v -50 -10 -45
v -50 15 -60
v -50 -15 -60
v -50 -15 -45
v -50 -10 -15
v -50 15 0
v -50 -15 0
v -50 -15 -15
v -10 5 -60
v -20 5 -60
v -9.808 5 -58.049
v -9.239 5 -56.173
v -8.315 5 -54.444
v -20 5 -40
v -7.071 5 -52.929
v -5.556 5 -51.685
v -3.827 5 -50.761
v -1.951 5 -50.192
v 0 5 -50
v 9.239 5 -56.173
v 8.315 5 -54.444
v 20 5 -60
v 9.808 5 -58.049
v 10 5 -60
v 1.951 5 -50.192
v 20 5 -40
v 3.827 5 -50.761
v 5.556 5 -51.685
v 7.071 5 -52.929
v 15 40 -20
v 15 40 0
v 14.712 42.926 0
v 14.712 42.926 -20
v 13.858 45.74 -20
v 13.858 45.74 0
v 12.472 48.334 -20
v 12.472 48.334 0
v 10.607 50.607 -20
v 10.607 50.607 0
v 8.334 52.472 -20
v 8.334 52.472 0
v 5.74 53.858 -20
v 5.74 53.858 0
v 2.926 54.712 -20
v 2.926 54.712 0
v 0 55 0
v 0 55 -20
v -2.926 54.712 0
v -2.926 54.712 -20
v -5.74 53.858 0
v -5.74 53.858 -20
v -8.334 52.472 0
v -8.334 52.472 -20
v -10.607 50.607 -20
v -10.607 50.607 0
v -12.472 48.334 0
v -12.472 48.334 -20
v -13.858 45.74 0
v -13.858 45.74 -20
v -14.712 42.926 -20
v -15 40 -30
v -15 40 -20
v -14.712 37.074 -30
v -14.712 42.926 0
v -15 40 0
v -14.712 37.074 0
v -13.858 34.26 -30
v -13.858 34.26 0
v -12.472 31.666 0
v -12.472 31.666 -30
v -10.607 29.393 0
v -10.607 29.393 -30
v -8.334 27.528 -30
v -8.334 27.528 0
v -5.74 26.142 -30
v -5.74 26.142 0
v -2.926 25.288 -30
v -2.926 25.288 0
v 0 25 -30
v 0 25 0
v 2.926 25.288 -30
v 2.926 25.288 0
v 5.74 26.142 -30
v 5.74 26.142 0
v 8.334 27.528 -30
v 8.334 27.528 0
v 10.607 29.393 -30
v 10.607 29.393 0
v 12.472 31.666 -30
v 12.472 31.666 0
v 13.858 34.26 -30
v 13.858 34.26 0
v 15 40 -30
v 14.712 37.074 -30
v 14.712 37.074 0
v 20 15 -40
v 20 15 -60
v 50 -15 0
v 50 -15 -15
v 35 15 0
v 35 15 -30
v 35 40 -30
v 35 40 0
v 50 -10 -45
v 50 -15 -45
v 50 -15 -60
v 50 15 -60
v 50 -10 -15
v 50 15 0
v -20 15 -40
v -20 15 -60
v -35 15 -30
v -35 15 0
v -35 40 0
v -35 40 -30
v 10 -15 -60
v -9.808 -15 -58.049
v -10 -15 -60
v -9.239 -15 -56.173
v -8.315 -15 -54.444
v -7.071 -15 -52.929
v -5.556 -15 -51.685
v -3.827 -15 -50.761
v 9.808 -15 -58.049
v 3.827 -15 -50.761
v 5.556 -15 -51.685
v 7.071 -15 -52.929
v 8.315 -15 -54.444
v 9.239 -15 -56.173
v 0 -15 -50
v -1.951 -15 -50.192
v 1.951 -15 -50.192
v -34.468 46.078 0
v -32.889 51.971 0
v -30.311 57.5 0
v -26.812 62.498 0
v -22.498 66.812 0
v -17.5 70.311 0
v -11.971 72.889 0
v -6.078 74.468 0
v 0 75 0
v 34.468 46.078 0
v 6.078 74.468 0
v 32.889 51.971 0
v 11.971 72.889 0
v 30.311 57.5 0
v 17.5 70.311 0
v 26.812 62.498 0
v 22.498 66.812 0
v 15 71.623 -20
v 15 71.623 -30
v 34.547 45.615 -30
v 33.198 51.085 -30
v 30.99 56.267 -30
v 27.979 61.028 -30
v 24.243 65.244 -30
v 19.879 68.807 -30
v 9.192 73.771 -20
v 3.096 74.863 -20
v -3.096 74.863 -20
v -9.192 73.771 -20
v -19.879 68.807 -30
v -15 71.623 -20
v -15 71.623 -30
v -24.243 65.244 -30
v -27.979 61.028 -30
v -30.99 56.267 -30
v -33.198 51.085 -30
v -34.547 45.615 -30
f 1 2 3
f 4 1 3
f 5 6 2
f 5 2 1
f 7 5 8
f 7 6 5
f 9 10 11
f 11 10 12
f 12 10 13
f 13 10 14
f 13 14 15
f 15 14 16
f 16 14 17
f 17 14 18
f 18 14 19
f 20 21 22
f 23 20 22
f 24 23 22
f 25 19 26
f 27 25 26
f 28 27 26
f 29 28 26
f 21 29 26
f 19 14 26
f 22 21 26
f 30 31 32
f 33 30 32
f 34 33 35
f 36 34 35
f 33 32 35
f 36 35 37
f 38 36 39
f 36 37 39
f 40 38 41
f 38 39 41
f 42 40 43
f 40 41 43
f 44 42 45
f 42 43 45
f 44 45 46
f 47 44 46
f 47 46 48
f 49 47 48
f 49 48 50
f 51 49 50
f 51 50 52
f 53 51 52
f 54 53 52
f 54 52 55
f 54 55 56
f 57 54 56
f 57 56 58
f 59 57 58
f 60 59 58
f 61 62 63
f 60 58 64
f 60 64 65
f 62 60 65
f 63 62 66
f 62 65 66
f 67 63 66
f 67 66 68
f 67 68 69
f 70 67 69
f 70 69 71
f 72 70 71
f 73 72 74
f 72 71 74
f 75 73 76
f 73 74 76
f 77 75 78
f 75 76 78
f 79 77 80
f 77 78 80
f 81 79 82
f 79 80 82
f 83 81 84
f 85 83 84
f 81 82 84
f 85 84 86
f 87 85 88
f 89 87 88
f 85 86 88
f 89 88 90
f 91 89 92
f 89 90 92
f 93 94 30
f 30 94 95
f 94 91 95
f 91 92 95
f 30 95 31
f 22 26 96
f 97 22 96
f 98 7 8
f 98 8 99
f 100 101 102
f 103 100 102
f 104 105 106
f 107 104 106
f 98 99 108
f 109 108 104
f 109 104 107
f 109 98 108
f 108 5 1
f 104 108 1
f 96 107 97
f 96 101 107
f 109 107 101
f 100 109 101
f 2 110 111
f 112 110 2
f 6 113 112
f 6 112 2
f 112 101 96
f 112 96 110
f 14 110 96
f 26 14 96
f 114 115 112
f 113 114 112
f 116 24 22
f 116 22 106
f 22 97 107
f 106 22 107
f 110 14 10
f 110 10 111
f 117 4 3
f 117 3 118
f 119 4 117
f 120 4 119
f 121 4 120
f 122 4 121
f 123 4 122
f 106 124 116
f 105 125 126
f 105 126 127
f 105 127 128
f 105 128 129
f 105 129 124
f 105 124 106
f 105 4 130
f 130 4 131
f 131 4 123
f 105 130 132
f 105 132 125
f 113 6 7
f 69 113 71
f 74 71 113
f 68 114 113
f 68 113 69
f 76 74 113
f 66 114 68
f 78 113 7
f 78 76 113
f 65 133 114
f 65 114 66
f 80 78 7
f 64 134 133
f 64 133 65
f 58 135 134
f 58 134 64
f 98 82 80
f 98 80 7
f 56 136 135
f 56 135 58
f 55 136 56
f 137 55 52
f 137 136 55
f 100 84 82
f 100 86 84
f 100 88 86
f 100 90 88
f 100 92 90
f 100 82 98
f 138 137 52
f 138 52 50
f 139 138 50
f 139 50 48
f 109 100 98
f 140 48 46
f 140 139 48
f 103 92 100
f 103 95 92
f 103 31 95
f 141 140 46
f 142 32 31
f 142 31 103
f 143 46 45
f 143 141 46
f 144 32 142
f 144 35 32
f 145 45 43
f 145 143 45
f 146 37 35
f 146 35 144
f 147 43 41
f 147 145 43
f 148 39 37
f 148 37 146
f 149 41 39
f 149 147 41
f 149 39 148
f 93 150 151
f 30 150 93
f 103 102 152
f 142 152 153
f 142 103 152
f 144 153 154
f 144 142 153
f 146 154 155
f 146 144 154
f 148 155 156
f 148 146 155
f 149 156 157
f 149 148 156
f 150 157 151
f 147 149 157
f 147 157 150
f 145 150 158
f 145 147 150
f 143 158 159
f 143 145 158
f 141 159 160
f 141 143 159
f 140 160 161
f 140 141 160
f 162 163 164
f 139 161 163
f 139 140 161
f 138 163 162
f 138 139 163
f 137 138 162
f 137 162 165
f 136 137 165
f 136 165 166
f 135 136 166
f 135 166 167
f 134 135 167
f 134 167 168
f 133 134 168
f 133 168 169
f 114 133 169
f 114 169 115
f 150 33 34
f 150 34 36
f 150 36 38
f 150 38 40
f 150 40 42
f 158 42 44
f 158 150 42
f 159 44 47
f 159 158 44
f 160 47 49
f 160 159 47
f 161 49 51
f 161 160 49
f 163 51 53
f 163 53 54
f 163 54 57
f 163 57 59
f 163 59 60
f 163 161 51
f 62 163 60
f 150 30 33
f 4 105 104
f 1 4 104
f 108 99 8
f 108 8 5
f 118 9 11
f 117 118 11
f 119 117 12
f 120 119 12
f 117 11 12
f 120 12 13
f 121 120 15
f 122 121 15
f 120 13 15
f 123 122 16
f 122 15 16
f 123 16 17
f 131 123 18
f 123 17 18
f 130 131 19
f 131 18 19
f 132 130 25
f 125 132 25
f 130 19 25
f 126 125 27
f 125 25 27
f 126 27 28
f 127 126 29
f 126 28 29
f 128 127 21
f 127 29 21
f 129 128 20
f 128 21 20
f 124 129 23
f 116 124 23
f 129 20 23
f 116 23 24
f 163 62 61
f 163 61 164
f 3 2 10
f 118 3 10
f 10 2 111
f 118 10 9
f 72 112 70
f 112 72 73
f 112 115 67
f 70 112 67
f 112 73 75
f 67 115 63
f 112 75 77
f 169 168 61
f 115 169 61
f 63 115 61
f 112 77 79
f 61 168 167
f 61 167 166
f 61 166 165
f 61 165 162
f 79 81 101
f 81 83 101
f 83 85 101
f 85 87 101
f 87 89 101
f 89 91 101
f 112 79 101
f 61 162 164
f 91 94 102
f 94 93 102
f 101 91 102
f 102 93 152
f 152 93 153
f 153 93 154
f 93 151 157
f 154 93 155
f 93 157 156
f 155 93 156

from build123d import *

# Parameters (mm, degrees)
SKETCH1_W           = 100
SKETCH1_H           = 30
BOSS_EXTRUDE1_DEPTH = 60
SKETCH1_3_R         = 15
BOSS_EXTRUDE2_DEPTH = 30
CUT_EXTRUDE1_START  = -40
SKETCH1_4_W         = 40
SKETCH1_4_H         = 10
CUT_EXTRUDE1_DEPTH  = 69.282039139
SKETCH2_W           = 30
SKETCH2_H           = 10
CUT_EXTRUDE2_DEPTH  = 139.654246239
CUT_EXTRUDE3_START  = -10
CUT_EXTRUDE3_DEPTH  = 10
SKETCH4_R           = 10
CUT_EXTRUDE4_DEPTH  = 105.880884817


with BuildPart() as part:
    # Sketch1 → Boss-Extrude1 (new body)
    with BuildSketch(Plane.XY):
        Rectangle(SKETCH1_W, SKETCH1_H)
    extrude(amount=-BOSS_EXTRUDE1_DEPTH)

    # Sketch1<3> → Boss-Extrude2 (add)
    with BuildSketch(Plane.XY):
        with BuildLine():
            Line((-35, 40), (-35, 15))
            Line((-35, 15), (-20, 15))
            Line((-20, 15), (20, 15))
            Line((20, 15), (35, 15))
            Line((35, 15), (35, 40))
            ThreePointArc((35, 40), (0, 75), (-35, 40))
        make_face()
        with Locations((0, 40)):
            Circle(SKETCH1_3_R, mode=Mode.SUBTRACT)
    extrude(amount=-BOSS_EXTRUDE2_DEPTH)

    # Sketch1<4> → Cut-Extrude1 (cut, through all)
    with BuildSketch(Plane.XY.offset(CUT_EXTRUDE1_START)):
        with Locations((0, 10)):
            Rectangle(SKETCH1_4_W, SKETCH1_4_H)
    extrude(amount=-CUT_EXTRUDE1_DEPTH, mode=Mode.SUBTRACT)

    # Sketch2 → Cut-Extrude2 (cut, through all)
    with BuildSketch(Plane(origin=(50, 0, 0), x_dir=(0, 0, -1), z_dir=(1, 0, 0))):
        with Locations((30, -15)):
            Rectangle(SKETCH2_W, SKETCH2_H)
    extrude(amount=-CUT_EXTRUDE2_DEPTH, mode=Mode.SUBTRACT)

    # Sketch3 → Cut-Extrude3 (cut)
    with BuildSketch(Plane(origin=(0, 0, -30), x_dir=(-1, 0, 0), z_dir=(0, 0, -1)).offset(CUT_EXTRUDE3_START)):
        with BuildLine():
            Line((15, 40), (15, 85.033892836))
            Line((15, 85.033892836), (-15, 85.033892836))
            Line((-15, 85.033892836), (-15, 40))
            ThreePointArc((-15, 40), (0, 25), (15, 40))
        make_face()
    extrude(amount=CUT_EXTRUDE3_DEPTH, mode=Mode.SUBTRACT)

    # Sketch4 → Cut-Extrude4 (cut, through all)
    with BuildSketch(Plane(origin=(0, 5, 0), x_dir=(1, 0, 0), z_dir=(0, 1, 0))):
        with Locations((0, 60)):
            Circle(SKETCH4_R)
    extrude(amount=-CUT_EXTRUDE4_DEPTH, mode=Mode.SUBTRACT)


solid = part.part
